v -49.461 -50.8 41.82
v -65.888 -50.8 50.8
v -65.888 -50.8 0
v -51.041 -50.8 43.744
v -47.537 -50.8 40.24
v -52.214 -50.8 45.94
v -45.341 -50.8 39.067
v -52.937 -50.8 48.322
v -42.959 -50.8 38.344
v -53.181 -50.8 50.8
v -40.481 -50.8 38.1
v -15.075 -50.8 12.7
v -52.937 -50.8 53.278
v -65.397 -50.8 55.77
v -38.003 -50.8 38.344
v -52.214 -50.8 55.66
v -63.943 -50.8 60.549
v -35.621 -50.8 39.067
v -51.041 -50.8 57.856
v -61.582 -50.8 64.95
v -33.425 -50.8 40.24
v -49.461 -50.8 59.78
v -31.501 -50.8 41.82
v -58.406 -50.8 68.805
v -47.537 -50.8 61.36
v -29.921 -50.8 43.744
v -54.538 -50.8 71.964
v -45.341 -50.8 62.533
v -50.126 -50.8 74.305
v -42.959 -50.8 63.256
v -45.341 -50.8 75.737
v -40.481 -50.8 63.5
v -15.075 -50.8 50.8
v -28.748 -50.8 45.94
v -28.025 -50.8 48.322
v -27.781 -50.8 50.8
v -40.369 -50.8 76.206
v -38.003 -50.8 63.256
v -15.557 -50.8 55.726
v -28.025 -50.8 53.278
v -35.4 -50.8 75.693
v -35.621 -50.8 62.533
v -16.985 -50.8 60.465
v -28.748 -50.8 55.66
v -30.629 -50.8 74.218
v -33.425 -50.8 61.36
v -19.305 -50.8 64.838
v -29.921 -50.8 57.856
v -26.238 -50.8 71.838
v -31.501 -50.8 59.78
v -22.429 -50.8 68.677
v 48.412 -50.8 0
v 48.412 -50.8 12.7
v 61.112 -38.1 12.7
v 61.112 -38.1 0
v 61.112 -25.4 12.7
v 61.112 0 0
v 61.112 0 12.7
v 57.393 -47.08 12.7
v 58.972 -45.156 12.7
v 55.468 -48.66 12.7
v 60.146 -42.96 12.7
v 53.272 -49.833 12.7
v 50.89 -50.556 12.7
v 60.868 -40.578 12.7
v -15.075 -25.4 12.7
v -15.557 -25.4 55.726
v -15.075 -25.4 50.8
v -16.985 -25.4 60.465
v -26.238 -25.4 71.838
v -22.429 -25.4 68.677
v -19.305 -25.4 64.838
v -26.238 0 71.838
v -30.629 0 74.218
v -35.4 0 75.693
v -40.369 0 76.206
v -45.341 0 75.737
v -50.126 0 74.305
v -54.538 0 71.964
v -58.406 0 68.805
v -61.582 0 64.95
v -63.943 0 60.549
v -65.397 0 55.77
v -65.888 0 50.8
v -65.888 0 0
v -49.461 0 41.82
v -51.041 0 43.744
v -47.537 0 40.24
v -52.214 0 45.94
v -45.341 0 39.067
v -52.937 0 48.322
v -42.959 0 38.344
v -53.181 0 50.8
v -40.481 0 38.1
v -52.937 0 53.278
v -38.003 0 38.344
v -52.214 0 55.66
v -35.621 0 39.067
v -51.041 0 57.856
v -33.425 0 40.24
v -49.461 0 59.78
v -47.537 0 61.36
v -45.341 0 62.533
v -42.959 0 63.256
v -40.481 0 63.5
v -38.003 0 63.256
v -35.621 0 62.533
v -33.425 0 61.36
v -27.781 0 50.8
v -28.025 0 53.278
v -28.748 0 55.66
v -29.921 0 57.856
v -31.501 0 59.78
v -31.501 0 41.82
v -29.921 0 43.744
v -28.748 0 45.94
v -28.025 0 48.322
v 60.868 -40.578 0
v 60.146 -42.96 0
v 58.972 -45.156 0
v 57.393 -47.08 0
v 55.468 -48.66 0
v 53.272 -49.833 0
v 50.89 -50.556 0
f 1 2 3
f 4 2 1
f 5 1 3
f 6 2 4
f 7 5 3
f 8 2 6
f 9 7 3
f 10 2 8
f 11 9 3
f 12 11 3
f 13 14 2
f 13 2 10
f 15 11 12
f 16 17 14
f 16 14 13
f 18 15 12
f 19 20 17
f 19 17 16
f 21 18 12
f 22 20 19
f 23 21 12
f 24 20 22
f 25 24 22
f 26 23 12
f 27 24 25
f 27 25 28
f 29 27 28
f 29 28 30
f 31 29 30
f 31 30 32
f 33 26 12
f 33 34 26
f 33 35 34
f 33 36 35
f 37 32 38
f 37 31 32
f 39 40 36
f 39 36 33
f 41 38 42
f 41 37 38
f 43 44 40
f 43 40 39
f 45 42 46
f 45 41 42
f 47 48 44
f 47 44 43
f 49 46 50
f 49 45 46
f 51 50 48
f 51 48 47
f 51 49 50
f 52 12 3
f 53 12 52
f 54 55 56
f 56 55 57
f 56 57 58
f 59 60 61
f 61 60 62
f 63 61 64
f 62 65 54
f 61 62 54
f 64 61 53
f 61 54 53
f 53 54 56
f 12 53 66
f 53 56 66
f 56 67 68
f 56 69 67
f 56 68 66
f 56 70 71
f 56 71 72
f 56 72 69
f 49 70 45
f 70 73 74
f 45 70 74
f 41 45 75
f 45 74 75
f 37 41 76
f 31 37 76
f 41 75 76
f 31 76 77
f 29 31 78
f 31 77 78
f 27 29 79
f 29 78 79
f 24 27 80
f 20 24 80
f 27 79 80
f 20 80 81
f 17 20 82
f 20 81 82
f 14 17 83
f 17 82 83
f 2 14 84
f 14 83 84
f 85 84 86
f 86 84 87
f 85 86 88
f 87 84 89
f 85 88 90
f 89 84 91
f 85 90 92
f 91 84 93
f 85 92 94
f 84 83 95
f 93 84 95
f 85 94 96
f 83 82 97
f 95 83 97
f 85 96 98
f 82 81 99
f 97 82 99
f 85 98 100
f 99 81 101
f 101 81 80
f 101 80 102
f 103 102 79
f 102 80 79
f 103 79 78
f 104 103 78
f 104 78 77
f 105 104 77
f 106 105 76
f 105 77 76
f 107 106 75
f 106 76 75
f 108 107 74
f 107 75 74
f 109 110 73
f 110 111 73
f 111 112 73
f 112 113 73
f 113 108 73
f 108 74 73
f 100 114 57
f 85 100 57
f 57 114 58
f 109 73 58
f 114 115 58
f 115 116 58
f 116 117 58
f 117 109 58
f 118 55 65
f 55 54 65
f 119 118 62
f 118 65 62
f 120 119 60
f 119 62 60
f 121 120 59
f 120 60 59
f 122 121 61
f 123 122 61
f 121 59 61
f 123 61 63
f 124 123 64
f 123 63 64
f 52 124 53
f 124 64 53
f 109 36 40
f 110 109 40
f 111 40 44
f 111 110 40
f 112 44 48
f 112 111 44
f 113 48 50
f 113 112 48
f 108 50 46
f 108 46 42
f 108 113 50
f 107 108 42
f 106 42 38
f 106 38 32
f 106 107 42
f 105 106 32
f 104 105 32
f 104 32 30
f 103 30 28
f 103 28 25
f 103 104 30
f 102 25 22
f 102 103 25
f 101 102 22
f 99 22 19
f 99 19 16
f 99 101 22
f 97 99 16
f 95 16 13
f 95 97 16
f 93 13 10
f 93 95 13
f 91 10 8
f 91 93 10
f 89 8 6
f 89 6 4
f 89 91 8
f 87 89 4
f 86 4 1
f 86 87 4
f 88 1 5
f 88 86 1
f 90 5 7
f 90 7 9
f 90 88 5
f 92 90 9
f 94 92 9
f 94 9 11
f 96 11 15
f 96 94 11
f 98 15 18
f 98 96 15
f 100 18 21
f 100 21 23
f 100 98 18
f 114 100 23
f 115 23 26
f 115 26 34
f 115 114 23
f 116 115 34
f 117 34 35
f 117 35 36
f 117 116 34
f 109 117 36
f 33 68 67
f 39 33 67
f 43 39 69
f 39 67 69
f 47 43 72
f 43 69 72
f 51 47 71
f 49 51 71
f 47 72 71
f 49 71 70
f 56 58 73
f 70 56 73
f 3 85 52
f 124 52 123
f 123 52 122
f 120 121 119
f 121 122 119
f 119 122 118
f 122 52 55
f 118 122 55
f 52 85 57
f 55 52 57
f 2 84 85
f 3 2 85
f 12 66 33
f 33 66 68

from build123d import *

# Parameters (mm, degrees)
F0_R     = 12.7
F1_DEPTH = 25.4
F2_R     = 12.7
F3_DEPTH = 25.4
F4_R     = 12.7


with BuildPart() as f1:
    # F0 (on Front) → F1 (new body)
    with BuildSketch(Plane.XZ):
        with BuildLine():
            Line((61.112298, 12.7), (-26.23751, 71.838392))
            ThreePointArc((-26.23751, 71.838392), (-52.389372, 73.242992), (-65.887702, 50.8))
            Line((-65.887702, 50.8), (-65.887702, 0))
            Line((-65.887702, 0), (61.112298, 0))
            Line((61.112298, 0), (61.112298, 12.7))
        make_face()
        with Locations((-40.48112, 50.8)):
            Circle(F0_R, mode=Mode.SUBTRACT)
    extrude(amount=F1_DEPTH)

    # F2 (on face) → F3 (join)
    with BuildSketch(Plane.XZ.offset(25.4)):
        with BuildLine():
            Line((61.112298, 0), (61.112298, 12.7))
            Line((61.112298, 12.7), (-15.074539, 12.7))
            Line((-15.074539, 12.7), (-15.074539, 50.8))
            ThreePointArc((-15.074539, 50.8), (-18.038128, 62.708252), (-26.23751, 71.838392))
            ThreePointArc((-26.23751, 71.838392), (-52.389372, 73.242992), (-65.887702, 50.8))
            Line((-65.887702, 50.8), (-65.887702, 12.7))
            Line((-65.887702, 12.7), (-65.887702, 0))
            Line((-65.887702, 0), (61.112298, 0))
        make_face()
        with Locations((-40.48112, 50.8)):
            Circle(F2_R, mode=Mode.SUBTRACT)
    extrude(amount=F3_DEPTH)

    # F4
    f4_edges = [f1.edges().sort_by_distance(p)[0] for p in [
        (61.112298, -50.8, 6.35),
    ]]
    fillet(f4_edges, radius=F4_R)


solid = f1.part
